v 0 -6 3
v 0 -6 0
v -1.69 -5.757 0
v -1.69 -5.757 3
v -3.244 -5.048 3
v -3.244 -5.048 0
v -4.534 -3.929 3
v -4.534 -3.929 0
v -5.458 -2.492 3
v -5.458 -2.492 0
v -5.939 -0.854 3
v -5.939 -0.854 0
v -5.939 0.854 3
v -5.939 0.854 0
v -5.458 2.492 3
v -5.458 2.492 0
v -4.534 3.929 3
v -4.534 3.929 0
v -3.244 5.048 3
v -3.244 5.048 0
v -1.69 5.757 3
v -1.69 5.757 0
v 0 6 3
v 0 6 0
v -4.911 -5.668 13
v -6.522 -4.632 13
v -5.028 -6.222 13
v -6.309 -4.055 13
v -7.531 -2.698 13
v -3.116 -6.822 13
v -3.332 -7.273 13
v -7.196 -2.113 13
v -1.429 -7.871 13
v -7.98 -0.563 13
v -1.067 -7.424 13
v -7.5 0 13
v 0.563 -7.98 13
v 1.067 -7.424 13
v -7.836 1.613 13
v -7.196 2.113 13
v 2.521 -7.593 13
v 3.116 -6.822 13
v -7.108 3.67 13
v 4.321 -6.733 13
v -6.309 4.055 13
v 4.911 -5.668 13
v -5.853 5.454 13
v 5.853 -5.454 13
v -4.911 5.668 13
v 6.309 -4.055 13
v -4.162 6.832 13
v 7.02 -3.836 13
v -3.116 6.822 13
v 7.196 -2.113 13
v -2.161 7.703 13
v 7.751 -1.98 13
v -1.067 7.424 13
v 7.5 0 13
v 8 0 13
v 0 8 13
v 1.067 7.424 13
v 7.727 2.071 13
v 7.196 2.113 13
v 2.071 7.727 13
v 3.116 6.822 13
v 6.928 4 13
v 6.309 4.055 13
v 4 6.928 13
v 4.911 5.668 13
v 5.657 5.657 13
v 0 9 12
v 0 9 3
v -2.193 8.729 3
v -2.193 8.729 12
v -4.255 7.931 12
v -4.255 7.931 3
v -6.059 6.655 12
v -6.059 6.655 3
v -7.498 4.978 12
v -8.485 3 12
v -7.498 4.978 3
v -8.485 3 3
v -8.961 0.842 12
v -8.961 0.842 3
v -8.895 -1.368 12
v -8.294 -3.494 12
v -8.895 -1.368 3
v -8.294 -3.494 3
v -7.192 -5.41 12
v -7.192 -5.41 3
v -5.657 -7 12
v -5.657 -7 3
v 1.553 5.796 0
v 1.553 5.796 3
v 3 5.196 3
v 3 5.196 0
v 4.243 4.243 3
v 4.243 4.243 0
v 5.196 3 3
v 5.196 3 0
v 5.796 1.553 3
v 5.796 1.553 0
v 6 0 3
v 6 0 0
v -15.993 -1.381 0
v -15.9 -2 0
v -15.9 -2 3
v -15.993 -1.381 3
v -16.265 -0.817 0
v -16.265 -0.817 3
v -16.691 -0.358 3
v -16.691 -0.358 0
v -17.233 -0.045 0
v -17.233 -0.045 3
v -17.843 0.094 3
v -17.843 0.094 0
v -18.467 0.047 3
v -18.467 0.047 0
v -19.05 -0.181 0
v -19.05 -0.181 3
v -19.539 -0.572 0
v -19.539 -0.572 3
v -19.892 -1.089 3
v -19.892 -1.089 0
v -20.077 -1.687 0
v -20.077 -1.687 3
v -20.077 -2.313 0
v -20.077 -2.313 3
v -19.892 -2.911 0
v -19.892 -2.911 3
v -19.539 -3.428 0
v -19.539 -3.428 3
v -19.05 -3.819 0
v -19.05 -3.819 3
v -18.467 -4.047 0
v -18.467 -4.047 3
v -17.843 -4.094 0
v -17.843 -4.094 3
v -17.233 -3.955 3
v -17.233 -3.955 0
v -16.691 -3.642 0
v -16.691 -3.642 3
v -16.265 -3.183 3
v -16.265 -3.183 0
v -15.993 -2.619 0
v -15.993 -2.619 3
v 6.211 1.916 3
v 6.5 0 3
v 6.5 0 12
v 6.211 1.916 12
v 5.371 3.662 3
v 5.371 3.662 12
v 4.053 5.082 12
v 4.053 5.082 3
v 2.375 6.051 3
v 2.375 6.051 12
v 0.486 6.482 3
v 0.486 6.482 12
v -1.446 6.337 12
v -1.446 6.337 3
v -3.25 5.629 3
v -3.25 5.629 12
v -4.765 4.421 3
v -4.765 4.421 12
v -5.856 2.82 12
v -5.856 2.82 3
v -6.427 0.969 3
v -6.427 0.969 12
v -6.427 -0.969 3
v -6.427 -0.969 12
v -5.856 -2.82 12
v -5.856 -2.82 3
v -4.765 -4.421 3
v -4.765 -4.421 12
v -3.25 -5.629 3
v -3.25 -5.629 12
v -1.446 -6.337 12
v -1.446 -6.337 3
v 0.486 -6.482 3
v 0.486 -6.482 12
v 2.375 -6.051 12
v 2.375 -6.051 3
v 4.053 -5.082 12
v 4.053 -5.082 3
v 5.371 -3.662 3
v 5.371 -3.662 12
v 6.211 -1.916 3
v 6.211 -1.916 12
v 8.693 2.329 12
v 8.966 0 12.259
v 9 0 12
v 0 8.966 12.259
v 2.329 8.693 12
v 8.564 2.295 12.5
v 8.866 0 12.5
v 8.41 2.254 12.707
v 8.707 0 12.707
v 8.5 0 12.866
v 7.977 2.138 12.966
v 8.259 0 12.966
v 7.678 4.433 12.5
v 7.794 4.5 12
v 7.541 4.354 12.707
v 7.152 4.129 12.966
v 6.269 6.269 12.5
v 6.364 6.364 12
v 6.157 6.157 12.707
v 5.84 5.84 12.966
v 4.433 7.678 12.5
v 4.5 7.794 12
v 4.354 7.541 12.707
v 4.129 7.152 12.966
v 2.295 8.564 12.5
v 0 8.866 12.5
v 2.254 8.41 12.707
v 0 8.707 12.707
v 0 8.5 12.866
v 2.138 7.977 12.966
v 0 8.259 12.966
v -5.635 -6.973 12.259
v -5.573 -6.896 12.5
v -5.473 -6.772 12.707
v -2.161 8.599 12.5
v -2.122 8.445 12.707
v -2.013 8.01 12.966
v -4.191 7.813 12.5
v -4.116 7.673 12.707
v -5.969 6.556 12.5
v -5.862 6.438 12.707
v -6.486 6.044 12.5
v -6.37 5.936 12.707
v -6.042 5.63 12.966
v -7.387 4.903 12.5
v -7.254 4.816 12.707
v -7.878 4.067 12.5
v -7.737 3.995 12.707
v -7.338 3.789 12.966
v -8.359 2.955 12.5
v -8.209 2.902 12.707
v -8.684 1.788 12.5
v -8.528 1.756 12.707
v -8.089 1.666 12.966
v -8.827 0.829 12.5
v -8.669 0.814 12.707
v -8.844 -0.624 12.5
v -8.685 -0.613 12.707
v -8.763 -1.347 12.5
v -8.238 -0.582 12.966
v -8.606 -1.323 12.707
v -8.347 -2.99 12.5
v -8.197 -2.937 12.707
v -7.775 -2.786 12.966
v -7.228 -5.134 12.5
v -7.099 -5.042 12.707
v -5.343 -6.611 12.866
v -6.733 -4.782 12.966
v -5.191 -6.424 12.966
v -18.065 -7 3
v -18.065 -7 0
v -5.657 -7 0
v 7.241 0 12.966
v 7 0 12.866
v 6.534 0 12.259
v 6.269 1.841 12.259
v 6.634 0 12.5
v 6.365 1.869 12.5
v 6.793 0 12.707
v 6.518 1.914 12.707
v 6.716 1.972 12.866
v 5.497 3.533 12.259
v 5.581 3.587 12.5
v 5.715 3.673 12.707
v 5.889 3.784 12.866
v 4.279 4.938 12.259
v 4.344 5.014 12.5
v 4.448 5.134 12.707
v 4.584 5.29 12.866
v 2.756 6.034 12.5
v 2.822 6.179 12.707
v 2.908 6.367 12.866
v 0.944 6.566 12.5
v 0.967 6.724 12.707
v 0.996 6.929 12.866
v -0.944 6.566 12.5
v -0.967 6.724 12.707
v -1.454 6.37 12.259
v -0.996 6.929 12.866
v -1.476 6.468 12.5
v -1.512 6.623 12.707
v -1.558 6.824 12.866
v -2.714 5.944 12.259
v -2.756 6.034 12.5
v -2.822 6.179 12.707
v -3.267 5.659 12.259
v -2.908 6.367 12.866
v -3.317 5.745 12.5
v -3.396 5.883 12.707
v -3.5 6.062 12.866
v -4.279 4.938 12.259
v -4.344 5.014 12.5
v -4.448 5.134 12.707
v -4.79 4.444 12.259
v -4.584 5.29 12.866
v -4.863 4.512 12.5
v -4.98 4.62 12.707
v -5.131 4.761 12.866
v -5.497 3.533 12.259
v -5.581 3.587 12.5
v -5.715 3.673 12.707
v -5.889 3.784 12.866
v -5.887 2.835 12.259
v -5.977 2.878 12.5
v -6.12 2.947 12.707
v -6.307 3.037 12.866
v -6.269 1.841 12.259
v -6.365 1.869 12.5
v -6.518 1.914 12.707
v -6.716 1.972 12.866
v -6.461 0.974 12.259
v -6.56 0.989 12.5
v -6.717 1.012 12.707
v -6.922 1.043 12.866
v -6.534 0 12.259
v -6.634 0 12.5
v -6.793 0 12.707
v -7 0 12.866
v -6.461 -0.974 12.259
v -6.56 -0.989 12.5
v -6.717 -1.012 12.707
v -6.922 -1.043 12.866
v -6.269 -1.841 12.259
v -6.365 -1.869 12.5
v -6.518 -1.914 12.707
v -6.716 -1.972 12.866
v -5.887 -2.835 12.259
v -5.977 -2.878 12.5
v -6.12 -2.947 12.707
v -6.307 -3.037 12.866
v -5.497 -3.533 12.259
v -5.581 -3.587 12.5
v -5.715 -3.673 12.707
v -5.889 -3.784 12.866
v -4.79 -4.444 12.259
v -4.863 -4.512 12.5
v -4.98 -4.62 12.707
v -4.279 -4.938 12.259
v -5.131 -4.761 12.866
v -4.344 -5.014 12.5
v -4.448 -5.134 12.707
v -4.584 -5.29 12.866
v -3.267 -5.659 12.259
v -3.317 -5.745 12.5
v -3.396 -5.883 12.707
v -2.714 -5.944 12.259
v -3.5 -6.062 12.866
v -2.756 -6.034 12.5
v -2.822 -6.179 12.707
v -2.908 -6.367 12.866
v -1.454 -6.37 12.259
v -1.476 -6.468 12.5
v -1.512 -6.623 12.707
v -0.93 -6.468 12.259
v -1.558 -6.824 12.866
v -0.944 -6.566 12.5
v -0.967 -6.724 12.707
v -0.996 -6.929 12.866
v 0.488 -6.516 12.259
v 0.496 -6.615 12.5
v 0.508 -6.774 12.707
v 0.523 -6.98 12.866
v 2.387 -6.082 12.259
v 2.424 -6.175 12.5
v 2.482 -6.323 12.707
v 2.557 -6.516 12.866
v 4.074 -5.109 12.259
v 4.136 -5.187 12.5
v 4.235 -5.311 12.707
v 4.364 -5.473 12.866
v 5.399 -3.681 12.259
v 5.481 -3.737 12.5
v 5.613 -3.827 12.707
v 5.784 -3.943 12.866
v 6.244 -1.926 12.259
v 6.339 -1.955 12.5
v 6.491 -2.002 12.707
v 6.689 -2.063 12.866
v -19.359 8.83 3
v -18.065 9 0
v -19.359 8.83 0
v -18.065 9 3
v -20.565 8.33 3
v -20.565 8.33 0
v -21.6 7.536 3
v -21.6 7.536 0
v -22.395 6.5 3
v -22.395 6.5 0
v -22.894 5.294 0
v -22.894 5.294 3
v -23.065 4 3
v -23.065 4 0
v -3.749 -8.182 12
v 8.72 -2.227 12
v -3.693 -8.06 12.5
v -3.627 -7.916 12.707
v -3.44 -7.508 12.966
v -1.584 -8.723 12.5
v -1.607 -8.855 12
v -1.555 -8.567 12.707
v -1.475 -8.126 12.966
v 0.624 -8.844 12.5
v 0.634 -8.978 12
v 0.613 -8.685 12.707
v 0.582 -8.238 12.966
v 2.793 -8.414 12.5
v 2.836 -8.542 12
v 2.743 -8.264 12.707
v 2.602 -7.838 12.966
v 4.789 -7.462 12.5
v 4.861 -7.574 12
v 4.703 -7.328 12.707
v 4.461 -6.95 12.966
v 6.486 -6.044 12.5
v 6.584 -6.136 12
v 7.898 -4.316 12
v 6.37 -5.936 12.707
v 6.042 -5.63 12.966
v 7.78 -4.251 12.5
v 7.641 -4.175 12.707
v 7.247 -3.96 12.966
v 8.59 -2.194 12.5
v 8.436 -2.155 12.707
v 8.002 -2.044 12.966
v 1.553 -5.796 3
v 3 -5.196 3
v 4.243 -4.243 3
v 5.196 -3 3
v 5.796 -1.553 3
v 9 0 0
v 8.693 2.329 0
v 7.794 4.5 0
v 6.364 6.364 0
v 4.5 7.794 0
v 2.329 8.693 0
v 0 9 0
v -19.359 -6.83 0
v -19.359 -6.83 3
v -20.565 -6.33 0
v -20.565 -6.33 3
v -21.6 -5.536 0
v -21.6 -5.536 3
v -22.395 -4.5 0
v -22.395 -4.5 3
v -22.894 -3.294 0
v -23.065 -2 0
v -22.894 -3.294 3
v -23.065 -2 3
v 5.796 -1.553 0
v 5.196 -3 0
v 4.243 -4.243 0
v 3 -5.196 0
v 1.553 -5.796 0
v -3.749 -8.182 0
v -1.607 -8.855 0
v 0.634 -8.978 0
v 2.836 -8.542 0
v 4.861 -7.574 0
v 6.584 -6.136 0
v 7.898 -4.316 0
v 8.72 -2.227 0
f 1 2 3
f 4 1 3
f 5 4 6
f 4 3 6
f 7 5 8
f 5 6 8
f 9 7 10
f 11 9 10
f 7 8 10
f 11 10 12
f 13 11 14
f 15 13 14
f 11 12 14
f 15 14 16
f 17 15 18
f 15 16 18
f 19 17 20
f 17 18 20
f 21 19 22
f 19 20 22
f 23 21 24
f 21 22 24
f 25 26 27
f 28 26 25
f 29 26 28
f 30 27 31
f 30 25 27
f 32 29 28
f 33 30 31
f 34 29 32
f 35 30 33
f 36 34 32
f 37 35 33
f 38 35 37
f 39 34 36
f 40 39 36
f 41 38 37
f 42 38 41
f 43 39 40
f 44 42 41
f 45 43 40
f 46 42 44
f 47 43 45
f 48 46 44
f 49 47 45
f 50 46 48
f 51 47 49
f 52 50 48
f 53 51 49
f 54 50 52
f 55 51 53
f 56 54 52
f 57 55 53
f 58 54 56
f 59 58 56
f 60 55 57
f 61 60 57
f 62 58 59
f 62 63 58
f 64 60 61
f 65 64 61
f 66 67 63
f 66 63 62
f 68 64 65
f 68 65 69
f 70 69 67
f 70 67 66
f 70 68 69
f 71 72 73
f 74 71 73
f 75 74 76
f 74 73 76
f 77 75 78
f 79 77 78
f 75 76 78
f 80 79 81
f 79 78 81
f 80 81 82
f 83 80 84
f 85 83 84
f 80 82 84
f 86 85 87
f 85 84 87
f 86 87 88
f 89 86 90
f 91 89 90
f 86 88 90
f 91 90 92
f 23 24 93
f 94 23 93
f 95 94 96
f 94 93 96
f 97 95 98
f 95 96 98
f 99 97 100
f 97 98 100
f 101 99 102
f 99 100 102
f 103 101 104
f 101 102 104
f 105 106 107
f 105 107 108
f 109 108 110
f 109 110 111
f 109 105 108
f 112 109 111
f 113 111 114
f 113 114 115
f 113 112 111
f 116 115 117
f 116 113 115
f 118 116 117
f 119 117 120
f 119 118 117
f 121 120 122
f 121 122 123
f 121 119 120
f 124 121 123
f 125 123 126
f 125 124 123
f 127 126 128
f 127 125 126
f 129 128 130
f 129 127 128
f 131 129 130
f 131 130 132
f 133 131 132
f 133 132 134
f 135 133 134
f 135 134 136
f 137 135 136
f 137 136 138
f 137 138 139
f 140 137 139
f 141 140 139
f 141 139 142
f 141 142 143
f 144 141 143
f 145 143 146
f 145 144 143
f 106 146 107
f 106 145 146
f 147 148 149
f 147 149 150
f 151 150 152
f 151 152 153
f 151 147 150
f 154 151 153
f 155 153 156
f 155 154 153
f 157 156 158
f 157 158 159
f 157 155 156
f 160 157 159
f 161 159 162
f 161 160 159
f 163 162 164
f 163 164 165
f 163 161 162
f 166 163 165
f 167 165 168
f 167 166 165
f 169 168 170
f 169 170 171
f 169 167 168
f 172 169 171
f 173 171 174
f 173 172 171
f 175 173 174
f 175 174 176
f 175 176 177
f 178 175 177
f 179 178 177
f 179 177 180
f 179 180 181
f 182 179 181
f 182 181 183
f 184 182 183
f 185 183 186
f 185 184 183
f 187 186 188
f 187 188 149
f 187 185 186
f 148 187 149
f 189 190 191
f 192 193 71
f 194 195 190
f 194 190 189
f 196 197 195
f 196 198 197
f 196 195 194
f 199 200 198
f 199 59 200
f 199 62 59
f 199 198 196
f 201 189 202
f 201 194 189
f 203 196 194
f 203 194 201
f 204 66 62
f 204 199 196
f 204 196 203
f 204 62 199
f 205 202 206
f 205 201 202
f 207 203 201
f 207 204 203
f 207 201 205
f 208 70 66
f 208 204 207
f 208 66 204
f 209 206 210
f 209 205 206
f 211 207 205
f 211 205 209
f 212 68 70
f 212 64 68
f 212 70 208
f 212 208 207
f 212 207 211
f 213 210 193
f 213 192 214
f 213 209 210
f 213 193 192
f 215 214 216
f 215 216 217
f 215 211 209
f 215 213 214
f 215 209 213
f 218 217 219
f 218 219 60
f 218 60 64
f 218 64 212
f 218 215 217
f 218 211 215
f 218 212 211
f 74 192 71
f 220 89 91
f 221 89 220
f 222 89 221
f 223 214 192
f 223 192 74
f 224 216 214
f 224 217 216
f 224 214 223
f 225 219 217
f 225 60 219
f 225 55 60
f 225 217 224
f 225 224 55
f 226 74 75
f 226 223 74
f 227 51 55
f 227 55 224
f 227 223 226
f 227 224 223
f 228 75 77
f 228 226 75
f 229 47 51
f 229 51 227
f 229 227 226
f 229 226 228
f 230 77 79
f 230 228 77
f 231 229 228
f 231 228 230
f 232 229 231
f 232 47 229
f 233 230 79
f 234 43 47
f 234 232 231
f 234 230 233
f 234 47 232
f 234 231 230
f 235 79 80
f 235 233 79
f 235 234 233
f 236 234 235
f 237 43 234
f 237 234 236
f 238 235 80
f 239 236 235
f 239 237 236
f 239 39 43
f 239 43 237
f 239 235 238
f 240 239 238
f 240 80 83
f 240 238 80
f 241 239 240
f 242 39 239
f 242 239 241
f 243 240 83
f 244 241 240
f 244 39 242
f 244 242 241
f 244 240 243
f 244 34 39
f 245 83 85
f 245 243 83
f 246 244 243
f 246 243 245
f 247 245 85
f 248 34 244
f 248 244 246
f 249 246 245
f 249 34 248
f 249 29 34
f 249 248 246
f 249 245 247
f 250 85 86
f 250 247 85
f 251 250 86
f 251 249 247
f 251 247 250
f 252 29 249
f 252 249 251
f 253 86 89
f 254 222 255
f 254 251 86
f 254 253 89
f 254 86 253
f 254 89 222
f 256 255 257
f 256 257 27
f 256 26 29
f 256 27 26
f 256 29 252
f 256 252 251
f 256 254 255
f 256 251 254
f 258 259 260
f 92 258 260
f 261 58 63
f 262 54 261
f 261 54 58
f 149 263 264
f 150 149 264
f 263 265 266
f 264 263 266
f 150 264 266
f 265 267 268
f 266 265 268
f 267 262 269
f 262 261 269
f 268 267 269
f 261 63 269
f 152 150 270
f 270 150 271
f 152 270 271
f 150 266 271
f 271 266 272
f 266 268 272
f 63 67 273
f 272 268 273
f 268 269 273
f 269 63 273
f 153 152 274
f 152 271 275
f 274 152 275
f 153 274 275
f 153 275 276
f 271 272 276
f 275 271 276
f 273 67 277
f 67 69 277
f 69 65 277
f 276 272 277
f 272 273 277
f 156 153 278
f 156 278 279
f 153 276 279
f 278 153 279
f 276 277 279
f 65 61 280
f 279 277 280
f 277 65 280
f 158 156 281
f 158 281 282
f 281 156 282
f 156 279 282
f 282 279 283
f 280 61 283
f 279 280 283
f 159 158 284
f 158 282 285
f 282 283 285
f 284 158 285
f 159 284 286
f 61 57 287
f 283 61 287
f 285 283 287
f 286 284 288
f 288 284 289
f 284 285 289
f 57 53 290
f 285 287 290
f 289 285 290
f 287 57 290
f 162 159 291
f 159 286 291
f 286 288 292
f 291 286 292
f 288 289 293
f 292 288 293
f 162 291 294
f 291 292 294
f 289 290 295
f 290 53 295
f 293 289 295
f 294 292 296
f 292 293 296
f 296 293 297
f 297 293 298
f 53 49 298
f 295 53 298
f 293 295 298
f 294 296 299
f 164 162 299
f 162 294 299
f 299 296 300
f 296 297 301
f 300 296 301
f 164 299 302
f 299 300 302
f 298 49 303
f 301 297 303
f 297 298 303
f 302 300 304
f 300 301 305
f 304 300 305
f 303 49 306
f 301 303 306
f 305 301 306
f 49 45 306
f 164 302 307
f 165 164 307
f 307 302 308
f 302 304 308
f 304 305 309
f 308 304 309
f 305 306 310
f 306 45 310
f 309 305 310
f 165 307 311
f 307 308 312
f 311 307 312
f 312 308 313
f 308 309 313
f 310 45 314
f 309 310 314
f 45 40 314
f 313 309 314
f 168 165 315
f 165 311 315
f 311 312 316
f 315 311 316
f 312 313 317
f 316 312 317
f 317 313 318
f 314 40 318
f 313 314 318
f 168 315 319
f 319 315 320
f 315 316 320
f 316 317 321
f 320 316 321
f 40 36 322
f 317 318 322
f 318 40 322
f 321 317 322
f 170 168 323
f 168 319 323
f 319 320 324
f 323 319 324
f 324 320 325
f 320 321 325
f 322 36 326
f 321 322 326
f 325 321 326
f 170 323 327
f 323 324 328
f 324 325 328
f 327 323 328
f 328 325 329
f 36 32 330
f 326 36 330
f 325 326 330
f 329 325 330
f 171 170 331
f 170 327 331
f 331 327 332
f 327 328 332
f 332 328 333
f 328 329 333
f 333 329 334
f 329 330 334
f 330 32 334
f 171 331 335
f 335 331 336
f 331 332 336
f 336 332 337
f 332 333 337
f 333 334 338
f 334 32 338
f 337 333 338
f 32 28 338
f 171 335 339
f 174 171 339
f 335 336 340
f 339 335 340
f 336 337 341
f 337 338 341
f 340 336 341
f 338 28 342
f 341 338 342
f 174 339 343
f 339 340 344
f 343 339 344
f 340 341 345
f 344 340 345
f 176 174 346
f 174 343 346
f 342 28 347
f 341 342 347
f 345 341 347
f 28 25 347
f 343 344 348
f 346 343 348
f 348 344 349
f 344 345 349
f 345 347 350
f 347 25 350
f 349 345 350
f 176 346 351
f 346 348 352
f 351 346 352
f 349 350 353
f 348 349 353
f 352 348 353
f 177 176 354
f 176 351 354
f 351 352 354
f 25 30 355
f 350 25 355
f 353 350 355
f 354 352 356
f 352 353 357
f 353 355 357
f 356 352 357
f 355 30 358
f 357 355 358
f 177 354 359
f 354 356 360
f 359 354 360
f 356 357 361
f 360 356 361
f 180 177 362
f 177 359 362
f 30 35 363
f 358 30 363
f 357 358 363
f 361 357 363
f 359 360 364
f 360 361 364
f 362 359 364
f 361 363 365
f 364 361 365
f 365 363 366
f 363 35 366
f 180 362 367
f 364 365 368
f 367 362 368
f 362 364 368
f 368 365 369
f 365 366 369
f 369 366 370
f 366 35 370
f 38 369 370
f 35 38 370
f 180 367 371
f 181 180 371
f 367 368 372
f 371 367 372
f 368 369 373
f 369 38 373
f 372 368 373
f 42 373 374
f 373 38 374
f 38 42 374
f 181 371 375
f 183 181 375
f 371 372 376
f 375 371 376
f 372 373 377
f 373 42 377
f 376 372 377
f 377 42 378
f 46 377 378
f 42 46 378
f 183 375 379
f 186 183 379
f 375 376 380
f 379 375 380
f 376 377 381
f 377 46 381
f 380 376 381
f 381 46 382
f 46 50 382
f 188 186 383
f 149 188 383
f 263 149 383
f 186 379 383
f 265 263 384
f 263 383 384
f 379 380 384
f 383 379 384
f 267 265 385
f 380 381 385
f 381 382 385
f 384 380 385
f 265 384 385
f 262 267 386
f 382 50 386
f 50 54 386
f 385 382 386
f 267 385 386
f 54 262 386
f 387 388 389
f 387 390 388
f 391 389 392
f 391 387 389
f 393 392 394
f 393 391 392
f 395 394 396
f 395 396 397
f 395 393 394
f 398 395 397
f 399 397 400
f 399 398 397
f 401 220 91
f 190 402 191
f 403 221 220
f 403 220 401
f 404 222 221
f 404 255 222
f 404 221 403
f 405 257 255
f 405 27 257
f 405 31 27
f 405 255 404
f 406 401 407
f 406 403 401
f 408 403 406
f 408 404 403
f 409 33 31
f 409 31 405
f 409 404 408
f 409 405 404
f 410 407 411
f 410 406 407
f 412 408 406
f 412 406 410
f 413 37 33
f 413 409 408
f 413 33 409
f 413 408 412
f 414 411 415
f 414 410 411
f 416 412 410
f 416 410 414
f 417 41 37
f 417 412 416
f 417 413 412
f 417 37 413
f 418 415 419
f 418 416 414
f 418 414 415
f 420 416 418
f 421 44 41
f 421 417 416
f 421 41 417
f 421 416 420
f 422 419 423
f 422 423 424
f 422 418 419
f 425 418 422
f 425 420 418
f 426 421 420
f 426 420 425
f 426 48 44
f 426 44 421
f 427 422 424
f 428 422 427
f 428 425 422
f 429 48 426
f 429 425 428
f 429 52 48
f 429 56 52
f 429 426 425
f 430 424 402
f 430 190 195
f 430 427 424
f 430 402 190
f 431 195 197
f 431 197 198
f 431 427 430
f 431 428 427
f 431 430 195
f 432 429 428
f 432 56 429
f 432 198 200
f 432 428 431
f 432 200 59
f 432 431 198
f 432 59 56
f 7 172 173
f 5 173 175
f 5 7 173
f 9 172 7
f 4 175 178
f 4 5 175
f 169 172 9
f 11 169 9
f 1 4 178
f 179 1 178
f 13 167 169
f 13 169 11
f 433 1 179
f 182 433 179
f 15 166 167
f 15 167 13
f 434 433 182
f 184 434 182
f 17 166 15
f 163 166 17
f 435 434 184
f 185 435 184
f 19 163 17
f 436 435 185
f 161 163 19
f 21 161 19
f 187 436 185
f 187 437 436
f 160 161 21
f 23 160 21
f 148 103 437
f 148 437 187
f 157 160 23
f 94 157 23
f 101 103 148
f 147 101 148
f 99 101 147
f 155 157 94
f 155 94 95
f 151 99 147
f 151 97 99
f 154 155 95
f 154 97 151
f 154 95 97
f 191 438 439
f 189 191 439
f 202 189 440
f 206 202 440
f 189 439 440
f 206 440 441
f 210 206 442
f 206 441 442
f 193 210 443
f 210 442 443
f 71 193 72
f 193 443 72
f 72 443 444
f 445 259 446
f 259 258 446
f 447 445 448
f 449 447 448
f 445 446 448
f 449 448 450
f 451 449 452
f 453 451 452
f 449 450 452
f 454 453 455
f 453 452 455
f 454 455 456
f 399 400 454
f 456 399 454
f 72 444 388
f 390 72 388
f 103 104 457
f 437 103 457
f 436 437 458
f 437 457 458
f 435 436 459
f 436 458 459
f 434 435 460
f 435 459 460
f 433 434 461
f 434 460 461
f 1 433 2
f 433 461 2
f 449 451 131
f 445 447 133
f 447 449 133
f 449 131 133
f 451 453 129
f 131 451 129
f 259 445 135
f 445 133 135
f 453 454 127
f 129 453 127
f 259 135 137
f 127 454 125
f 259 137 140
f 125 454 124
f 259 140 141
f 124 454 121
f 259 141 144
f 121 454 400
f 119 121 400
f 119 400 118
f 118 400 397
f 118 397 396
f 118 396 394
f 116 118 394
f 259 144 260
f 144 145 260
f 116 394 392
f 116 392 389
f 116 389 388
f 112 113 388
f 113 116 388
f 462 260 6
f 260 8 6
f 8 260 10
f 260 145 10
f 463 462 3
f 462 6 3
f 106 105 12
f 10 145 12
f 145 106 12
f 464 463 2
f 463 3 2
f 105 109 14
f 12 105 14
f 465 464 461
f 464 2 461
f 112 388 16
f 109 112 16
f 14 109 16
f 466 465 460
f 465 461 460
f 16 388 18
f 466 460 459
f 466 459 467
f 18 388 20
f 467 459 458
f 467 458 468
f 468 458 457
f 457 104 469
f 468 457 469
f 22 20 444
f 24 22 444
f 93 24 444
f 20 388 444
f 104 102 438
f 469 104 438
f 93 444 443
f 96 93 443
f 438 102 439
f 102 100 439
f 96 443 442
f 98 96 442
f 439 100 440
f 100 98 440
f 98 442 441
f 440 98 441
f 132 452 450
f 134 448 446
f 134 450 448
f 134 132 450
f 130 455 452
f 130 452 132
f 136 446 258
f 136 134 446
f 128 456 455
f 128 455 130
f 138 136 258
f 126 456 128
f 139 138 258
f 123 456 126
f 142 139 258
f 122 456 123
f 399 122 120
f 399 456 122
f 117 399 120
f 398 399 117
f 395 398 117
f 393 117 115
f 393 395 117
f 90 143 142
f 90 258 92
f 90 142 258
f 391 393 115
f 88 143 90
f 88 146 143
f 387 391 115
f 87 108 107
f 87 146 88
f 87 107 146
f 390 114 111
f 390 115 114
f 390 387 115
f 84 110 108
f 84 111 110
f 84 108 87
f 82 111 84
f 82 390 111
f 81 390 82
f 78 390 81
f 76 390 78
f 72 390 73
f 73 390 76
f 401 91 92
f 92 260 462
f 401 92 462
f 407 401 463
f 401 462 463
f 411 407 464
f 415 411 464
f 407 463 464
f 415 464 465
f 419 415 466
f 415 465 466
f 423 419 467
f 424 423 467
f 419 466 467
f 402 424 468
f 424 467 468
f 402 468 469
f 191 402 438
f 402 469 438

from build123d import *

# Parameters (mm, degrees)
F0_R     = 2.1
F1_DEPTH = 3
F2_R     = 5
F3_R     = 6.5
F4_DEPTH = 10
F5_R     = 1


with BuildPart() as f1:
    # F0 (on Top) → F1 (new body)
    with BuildSketch(Plane.XY):
        with BuildLine():
            ThreePointArc((-5.656854, -7), (-8.485281, 3), (0, 9))
            Line((0, 9), (-23.064781, 9))
            Line((-23.064781, 9), (-23.064781, -7))
            Line((-23.064781, -7), (-5.656854, -7))
        make_face()
        with Locations((-18, -2)):
            Circle(F0_R, mode=Mode.SUBTRACT)
        with BuildLine():
            ThreePointArc((0, -6), (-6, 0), (0, 6))
            Line((0, 6), (0, 9))
            ThreePointArc((0, 9), (-8.485281, 3), (-5.656854, -7))
            Line((-5.656854, -7), (0, -7))
            Line((0, -7), (0, -6))
        make_face()
        with BuildLine():
            ThreePointArc((0, 6), (4.242641, 4.242641), (6, 0))
            ThreePointArc((6, 0), (4.242641, -4.242641), (0, -6))
            Line((0, -6), (0, -7))
            Line((0, -7), (-5.656854, -7))
            ThreePointArc((-5.656854, -7), (3.87868, -8.12132), (9, 0))
            ThreePointArc((9, 0), (6.363961, 6.363961), (0, 9))
            Line((0, 9), (0, 6))
        make_face()
    extrude(amount=F1_DEPTH)

    # F2
    f2_edges = [f1.edges().sort_by_distance(p)[0] for p in [
        (-23.064781, 9, 1.5),
        (-23.064781, -7, 1.5),
    ]]
    fillet(f2_edges, radius=F2_R)

    # F3 (on face) → F4 (join)
    with BuildSketch(Plane.XY.offset(3)):
        with BuildLine():
            ThreePointArc((-5.656854, -7), (3.87868, -8.12132), (9, 0))
            ThreePointArc((9, 0), (6.363961, 6.363961), (0, 9))
            ThreePointArc((0, 9), (-8.485281, 3), (-5.656854, -7))
        make_face()
        Circle(F3_R, mode=Mode.SUBTRACT)
    extrude(amount=F4_DEPTH)

    # F5
    f5_edges = [f1.edges().sort_by_distance(p)[0] for p in [
        (0, -9, 13),
        (-6.5, 0, 13),
    ]]
    fillet(f5_edges, radius=F5_R)


solid = f1.part
